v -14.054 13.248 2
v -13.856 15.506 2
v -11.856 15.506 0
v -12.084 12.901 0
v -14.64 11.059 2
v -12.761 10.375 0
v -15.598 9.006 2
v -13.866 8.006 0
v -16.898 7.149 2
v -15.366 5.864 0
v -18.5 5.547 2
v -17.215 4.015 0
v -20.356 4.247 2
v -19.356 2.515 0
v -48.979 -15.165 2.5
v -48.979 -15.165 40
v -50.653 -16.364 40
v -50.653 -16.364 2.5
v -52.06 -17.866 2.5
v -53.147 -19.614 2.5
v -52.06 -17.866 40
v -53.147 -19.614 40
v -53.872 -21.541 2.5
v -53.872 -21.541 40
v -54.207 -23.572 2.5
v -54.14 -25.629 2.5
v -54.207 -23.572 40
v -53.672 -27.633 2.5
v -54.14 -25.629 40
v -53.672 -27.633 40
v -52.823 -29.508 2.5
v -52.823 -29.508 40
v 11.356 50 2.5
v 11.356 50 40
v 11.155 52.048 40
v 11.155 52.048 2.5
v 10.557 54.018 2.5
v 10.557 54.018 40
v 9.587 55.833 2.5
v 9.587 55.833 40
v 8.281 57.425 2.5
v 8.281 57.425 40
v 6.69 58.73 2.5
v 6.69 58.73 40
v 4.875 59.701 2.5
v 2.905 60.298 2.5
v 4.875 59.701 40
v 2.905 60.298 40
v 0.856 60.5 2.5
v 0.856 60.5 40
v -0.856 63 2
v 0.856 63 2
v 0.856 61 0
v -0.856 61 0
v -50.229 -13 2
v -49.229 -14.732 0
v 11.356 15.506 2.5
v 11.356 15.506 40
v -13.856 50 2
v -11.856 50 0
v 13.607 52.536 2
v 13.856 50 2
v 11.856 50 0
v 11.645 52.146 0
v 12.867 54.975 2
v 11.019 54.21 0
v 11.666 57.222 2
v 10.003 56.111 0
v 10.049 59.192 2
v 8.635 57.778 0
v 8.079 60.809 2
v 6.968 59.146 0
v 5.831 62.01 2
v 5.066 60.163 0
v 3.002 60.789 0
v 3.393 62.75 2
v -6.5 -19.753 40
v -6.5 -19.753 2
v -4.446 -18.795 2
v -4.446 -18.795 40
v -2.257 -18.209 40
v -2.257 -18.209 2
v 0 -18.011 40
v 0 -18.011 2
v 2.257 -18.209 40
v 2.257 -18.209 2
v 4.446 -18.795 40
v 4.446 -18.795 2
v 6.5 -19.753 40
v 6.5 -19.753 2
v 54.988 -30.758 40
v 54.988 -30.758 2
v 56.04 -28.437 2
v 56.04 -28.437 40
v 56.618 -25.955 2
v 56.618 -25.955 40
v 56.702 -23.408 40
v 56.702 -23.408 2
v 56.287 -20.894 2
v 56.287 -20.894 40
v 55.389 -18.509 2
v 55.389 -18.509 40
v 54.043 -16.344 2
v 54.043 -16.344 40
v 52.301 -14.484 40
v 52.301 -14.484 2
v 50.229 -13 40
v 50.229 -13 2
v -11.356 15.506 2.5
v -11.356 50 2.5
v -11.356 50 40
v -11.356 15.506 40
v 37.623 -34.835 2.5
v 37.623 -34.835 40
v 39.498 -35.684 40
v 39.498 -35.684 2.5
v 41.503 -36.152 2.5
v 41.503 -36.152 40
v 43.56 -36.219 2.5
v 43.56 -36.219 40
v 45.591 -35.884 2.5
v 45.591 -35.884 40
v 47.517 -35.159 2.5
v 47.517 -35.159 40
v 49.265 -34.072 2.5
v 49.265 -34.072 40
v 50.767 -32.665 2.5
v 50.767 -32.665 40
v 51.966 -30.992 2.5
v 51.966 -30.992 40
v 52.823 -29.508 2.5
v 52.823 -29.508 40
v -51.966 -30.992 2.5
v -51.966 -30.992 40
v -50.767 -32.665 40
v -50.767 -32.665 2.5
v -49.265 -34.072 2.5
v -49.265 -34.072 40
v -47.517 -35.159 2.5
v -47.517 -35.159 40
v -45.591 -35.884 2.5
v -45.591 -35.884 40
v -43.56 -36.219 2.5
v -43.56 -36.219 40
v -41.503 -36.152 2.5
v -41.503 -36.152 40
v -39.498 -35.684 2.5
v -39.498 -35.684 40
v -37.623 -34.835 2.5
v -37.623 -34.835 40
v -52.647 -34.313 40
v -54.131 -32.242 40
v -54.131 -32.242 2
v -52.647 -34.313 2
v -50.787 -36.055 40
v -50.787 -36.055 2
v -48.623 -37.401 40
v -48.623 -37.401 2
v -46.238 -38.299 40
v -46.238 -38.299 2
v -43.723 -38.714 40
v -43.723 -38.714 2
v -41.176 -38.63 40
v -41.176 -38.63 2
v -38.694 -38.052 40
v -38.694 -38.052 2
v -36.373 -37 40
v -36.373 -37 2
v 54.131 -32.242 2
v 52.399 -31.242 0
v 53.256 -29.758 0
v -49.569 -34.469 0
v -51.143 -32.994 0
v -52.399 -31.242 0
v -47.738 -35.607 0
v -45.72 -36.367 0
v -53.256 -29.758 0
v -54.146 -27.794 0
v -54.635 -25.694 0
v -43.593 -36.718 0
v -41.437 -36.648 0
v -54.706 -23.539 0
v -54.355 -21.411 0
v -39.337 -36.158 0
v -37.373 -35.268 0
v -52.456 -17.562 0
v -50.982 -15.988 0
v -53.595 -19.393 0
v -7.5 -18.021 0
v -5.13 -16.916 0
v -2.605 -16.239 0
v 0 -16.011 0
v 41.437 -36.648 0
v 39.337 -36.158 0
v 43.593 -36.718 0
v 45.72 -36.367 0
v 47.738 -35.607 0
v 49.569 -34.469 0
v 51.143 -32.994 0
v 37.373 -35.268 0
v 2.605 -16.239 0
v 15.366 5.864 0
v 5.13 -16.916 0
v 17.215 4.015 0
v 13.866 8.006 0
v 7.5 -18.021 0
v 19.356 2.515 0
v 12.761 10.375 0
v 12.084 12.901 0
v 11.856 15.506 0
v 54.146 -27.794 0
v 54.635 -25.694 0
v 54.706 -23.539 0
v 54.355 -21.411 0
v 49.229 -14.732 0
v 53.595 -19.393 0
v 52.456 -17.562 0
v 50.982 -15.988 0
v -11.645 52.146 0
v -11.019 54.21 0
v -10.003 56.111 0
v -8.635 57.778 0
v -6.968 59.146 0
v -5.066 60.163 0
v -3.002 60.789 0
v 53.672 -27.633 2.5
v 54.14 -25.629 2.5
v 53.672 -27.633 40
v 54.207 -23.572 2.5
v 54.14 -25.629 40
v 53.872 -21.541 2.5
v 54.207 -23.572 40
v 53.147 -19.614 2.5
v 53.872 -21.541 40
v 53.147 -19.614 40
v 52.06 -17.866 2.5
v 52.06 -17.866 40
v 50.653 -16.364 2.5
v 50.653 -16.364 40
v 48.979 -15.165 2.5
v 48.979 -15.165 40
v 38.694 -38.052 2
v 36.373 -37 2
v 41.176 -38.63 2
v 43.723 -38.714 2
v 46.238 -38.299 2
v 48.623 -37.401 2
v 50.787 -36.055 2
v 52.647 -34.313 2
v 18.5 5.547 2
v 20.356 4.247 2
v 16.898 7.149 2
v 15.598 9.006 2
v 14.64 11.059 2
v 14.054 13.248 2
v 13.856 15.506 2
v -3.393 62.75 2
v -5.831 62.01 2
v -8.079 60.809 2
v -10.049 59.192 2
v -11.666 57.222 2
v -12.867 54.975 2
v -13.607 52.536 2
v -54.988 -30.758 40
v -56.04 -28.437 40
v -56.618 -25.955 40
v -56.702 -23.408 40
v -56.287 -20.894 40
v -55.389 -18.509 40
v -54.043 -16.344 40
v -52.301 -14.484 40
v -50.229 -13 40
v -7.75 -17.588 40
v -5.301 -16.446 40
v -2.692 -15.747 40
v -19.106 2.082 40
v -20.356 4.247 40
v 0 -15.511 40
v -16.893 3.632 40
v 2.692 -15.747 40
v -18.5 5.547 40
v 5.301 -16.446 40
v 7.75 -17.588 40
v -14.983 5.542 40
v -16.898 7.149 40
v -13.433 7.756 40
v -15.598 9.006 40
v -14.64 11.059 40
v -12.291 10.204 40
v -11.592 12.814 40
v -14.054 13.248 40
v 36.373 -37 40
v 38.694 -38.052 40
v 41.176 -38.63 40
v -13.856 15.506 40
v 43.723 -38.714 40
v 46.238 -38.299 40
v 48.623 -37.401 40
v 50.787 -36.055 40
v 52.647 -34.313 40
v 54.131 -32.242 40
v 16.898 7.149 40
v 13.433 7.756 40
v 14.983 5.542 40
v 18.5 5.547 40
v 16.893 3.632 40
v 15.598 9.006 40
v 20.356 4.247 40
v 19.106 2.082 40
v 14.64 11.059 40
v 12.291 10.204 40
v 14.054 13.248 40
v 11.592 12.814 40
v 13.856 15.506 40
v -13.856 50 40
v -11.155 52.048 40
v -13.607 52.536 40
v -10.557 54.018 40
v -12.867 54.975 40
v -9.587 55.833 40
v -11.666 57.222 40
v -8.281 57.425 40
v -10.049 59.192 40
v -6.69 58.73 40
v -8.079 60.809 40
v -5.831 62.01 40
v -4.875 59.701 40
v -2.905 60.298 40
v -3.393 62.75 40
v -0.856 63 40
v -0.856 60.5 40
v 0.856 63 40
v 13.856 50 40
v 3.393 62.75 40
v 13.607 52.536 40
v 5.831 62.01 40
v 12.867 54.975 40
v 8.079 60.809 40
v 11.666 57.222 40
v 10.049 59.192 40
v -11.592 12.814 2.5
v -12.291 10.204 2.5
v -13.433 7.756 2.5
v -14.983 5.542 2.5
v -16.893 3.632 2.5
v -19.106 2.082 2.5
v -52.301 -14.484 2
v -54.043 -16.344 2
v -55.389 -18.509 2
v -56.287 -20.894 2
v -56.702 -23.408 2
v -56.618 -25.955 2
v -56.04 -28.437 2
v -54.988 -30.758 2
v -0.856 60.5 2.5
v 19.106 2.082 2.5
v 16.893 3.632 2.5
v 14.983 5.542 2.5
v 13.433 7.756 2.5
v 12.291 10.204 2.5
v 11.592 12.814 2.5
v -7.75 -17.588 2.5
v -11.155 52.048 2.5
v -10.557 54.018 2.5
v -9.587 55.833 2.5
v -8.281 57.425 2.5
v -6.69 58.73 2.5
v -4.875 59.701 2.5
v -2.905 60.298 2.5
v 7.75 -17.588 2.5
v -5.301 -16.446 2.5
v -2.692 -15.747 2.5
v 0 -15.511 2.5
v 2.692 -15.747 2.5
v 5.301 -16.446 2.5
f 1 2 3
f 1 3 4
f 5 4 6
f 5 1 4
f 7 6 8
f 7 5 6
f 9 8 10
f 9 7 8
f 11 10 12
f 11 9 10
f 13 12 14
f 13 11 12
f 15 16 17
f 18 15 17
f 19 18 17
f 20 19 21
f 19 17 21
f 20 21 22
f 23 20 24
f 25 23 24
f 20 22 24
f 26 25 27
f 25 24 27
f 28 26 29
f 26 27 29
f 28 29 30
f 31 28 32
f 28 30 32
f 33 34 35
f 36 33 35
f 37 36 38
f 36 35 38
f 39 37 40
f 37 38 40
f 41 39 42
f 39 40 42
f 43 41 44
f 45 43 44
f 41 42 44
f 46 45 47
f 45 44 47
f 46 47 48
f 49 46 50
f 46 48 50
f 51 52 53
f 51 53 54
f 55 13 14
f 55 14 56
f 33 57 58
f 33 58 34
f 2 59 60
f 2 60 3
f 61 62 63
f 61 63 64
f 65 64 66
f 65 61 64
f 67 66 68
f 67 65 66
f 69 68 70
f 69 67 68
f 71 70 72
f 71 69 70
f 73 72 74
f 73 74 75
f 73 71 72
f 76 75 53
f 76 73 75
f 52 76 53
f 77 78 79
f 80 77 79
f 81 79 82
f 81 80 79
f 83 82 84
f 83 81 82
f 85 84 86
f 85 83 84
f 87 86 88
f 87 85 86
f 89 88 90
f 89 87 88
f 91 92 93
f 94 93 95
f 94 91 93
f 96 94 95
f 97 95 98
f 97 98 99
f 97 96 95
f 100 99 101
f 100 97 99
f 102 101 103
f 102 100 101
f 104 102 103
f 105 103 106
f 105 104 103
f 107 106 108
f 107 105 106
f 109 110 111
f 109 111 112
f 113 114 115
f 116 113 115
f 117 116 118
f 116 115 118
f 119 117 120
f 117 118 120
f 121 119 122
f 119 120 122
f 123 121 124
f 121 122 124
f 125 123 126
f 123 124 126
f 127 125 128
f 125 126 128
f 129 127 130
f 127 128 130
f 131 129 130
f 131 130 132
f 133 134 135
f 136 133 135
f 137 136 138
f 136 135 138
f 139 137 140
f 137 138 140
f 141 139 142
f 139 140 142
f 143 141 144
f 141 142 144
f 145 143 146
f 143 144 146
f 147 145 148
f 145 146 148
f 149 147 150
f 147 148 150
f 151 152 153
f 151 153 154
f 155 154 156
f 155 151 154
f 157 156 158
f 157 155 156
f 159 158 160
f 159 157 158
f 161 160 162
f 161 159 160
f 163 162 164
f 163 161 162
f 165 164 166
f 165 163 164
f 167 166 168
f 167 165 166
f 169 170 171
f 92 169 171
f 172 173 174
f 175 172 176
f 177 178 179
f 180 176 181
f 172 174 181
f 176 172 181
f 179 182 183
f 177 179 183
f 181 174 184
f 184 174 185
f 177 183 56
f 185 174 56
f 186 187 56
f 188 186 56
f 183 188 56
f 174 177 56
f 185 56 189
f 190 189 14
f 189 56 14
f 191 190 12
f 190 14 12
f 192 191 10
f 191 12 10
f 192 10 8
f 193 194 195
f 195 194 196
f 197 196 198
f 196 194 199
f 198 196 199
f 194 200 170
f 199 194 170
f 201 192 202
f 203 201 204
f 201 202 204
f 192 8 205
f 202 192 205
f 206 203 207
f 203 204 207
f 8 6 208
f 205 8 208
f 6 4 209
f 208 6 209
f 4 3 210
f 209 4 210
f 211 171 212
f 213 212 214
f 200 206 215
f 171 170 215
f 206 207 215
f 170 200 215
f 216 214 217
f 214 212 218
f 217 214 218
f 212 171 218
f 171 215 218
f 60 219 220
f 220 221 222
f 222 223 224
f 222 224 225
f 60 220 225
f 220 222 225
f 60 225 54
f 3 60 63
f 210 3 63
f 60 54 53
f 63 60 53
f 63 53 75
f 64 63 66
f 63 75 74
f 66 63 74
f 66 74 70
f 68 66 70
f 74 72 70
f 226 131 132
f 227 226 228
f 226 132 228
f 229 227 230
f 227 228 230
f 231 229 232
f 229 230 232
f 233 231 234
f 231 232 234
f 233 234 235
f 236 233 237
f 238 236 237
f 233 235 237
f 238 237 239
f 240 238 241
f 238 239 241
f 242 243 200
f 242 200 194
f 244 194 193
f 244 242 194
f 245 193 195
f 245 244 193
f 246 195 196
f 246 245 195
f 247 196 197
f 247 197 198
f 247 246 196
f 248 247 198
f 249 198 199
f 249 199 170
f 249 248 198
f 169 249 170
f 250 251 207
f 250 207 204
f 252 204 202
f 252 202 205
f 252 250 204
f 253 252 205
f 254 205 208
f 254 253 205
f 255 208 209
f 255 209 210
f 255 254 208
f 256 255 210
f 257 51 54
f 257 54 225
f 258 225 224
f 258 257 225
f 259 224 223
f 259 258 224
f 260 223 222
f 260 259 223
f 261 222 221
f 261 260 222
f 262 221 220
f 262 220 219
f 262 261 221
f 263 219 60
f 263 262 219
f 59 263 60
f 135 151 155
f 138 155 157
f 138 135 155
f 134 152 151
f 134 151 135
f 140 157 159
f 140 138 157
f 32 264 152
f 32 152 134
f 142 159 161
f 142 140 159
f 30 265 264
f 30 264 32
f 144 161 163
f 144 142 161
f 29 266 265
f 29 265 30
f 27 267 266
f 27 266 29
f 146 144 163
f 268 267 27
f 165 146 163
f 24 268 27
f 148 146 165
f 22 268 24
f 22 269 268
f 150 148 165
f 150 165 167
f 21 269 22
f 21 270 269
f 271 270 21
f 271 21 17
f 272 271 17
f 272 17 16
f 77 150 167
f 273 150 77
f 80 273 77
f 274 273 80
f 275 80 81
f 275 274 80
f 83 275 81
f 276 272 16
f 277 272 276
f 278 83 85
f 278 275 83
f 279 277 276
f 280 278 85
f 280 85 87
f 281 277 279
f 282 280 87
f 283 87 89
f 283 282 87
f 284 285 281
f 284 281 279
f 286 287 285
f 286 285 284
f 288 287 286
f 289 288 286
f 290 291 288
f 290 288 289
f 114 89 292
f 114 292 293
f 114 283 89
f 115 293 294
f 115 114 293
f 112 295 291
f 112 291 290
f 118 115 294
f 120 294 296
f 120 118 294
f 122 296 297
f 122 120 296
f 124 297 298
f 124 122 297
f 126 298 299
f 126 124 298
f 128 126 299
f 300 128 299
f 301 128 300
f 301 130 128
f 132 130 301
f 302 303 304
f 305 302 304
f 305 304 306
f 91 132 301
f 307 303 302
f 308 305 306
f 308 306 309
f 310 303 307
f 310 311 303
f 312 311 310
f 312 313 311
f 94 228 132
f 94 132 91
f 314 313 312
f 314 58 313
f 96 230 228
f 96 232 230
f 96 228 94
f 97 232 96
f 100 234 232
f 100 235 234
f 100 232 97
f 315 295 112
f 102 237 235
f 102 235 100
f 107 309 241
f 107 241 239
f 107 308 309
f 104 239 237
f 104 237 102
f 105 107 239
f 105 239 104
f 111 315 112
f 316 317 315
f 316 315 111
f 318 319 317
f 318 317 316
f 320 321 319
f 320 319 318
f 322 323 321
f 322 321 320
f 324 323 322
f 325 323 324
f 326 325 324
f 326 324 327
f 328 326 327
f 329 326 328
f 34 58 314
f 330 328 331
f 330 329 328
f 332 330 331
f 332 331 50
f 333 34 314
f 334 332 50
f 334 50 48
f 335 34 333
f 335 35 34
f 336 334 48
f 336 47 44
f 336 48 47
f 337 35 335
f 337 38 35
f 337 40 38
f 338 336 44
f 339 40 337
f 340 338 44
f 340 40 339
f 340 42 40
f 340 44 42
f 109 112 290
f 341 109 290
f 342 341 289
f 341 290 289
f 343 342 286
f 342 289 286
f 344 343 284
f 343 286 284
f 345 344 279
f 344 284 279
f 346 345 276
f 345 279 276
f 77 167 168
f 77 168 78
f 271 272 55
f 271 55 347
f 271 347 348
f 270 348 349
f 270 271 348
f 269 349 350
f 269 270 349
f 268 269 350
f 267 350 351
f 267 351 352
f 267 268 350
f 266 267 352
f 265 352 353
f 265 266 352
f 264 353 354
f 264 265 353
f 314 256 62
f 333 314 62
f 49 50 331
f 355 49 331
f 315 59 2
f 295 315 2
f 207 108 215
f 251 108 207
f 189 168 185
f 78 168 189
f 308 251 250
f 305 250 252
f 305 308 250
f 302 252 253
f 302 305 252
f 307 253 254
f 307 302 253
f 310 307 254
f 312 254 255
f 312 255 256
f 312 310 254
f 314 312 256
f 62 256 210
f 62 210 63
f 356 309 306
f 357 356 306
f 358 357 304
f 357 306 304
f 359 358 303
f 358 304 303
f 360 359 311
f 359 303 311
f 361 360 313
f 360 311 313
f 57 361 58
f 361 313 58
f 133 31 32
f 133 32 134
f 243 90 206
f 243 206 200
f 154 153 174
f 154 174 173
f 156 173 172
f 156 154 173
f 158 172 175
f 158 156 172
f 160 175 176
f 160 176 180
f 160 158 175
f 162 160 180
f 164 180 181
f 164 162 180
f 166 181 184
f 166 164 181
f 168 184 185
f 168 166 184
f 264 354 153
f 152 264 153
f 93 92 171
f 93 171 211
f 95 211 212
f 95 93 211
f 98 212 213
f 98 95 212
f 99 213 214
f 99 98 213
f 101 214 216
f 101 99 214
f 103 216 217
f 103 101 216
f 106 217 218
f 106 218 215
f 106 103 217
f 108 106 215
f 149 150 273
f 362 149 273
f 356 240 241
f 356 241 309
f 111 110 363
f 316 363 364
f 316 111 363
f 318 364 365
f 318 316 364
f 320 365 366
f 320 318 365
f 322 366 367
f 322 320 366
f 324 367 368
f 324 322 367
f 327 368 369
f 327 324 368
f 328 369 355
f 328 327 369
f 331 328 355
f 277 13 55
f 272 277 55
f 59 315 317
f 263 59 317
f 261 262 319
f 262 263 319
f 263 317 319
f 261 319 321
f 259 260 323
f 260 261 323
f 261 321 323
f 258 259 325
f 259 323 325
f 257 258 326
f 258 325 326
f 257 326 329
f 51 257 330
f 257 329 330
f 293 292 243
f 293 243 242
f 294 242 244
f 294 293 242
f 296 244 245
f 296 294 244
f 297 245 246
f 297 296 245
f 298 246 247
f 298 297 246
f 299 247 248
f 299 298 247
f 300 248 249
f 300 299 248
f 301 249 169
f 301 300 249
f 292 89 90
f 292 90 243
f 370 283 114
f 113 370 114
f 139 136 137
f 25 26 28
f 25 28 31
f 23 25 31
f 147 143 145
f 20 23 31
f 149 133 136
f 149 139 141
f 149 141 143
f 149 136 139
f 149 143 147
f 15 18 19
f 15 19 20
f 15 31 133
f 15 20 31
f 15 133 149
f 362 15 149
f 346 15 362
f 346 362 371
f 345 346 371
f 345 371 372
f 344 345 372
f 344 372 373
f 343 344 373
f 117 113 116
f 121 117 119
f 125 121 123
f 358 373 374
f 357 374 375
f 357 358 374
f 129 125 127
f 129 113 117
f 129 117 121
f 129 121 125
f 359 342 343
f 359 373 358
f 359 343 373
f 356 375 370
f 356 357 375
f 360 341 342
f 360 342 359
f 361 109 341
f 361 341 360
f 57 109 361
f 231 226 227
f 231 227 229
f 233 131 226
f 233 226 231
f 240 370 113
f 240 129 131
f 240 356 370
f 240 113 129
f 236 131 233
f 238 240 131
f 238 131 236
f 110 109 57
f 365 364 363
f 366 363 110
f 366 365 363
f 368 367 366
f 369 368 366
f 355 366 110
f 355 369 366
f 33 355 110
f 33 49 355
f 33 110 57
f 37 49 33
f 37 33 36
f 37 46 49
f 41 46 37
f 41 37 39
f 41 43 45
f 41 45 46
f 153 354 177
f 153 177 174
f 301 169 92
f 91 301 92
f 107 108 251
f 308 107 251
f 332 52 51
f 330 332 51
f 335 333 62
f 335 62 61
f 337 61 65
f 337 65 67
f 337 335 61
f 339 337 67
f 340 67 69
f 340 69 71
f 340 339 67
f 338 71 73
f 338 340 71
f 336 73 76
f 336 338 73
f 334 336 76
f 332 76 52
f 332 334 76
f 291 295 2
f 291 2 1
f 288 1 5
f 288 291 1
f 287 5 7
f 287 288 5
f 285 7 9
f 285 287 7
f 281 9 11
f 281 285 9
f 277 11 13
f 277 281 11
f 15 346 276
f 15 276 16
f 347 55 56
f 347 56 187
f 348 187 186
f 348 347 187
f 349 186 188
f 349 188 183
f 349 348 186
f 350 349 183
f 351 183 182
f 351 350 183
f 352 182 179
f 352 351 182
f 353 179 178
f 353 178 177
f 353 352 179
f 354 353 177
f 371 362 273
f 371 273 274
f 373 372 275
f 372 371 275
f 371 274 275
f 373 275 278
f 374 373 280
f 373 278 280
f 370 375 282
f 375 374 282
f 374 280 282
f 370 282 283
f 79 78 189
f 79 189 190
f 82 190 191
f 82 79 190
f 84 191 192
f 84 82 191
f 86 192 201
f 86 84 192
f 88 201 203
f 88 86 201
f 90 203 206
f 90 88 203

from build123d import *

# Parameters (mm, degrees)
F1_DEPTH = 40
F2_R     = 13
F3_T     = -2.5
F4_SIZE  = 2


with BuildPart() as f1:
    # F0 (on Top) → F1 (new body)
    with BuildSketch(Plane.XY):
        Polygon((-13.856406, 63), (-13.856406, 8), (-61.487804, -19.5), (-47.631397, -43.5), (0, -16), (47.631397, -43.5), (61.487804, -19.5), (13.856406, 8), (13.856406, 63), align=None)
    extrude(amount=F1_DEPTH)

    # F2
    f2_edges = [f1.edges().sort_by_distance(p)[0] for p in [
        (-47.631397, -43.5, 20),
        (-61.487804, -19.5, 20),
        (0, -16, 20),
        (47.631397, -43.5, 20),
        (61.487804, -19.5, 20),
        (13.856406, 8, 20),
        (13.856406, 63, 20),
        (-13.856406, 63, 20),
        (-13.856406, 8, 20),
    ]]
    fillet(f2_edges, radius=F2_R)

    # F3
    f3_openings = [f1.faces().sort_by_distance(p)[0] for p in [
        (0, 0, 40),
    ]]
    offset(amount=F3_T, openings=f3_openings)

    # F4
    f4_edges = [f1.edges().sort_by_distance(p)[0] for p in [
        (-21.436533, -28.376388, 0),
        (-46.237715, -38.298705, 0),
        (0, -18.011107, 0),
        (-54.5596, -31.5, 0),
        (21.436533, -28.376388, 0),
        (-56.286509, -20.893683, 0),
        (46.237715, -38.298705, 0),
        (-35.29294, -4.376388, 0),
        (54.5596, -31.5, 0),
        (-15.598076, 9.005553, 0),
        (56.286509, -20.893683, 0),
        (-13.856406, 32.752777, 0),
        (35.29294, -4.376388, 0),
        (-10.048795, 59.192388, 0),
        (15.598076, 9.005553, 0),
        (0, 63, 0),
        (13.856406, 32.752777, 0),
        (10.048795, 59.192388, 0),
    ]]
    chamfer(f4_edges, length=F4_SIZE)


solid = f1.part
